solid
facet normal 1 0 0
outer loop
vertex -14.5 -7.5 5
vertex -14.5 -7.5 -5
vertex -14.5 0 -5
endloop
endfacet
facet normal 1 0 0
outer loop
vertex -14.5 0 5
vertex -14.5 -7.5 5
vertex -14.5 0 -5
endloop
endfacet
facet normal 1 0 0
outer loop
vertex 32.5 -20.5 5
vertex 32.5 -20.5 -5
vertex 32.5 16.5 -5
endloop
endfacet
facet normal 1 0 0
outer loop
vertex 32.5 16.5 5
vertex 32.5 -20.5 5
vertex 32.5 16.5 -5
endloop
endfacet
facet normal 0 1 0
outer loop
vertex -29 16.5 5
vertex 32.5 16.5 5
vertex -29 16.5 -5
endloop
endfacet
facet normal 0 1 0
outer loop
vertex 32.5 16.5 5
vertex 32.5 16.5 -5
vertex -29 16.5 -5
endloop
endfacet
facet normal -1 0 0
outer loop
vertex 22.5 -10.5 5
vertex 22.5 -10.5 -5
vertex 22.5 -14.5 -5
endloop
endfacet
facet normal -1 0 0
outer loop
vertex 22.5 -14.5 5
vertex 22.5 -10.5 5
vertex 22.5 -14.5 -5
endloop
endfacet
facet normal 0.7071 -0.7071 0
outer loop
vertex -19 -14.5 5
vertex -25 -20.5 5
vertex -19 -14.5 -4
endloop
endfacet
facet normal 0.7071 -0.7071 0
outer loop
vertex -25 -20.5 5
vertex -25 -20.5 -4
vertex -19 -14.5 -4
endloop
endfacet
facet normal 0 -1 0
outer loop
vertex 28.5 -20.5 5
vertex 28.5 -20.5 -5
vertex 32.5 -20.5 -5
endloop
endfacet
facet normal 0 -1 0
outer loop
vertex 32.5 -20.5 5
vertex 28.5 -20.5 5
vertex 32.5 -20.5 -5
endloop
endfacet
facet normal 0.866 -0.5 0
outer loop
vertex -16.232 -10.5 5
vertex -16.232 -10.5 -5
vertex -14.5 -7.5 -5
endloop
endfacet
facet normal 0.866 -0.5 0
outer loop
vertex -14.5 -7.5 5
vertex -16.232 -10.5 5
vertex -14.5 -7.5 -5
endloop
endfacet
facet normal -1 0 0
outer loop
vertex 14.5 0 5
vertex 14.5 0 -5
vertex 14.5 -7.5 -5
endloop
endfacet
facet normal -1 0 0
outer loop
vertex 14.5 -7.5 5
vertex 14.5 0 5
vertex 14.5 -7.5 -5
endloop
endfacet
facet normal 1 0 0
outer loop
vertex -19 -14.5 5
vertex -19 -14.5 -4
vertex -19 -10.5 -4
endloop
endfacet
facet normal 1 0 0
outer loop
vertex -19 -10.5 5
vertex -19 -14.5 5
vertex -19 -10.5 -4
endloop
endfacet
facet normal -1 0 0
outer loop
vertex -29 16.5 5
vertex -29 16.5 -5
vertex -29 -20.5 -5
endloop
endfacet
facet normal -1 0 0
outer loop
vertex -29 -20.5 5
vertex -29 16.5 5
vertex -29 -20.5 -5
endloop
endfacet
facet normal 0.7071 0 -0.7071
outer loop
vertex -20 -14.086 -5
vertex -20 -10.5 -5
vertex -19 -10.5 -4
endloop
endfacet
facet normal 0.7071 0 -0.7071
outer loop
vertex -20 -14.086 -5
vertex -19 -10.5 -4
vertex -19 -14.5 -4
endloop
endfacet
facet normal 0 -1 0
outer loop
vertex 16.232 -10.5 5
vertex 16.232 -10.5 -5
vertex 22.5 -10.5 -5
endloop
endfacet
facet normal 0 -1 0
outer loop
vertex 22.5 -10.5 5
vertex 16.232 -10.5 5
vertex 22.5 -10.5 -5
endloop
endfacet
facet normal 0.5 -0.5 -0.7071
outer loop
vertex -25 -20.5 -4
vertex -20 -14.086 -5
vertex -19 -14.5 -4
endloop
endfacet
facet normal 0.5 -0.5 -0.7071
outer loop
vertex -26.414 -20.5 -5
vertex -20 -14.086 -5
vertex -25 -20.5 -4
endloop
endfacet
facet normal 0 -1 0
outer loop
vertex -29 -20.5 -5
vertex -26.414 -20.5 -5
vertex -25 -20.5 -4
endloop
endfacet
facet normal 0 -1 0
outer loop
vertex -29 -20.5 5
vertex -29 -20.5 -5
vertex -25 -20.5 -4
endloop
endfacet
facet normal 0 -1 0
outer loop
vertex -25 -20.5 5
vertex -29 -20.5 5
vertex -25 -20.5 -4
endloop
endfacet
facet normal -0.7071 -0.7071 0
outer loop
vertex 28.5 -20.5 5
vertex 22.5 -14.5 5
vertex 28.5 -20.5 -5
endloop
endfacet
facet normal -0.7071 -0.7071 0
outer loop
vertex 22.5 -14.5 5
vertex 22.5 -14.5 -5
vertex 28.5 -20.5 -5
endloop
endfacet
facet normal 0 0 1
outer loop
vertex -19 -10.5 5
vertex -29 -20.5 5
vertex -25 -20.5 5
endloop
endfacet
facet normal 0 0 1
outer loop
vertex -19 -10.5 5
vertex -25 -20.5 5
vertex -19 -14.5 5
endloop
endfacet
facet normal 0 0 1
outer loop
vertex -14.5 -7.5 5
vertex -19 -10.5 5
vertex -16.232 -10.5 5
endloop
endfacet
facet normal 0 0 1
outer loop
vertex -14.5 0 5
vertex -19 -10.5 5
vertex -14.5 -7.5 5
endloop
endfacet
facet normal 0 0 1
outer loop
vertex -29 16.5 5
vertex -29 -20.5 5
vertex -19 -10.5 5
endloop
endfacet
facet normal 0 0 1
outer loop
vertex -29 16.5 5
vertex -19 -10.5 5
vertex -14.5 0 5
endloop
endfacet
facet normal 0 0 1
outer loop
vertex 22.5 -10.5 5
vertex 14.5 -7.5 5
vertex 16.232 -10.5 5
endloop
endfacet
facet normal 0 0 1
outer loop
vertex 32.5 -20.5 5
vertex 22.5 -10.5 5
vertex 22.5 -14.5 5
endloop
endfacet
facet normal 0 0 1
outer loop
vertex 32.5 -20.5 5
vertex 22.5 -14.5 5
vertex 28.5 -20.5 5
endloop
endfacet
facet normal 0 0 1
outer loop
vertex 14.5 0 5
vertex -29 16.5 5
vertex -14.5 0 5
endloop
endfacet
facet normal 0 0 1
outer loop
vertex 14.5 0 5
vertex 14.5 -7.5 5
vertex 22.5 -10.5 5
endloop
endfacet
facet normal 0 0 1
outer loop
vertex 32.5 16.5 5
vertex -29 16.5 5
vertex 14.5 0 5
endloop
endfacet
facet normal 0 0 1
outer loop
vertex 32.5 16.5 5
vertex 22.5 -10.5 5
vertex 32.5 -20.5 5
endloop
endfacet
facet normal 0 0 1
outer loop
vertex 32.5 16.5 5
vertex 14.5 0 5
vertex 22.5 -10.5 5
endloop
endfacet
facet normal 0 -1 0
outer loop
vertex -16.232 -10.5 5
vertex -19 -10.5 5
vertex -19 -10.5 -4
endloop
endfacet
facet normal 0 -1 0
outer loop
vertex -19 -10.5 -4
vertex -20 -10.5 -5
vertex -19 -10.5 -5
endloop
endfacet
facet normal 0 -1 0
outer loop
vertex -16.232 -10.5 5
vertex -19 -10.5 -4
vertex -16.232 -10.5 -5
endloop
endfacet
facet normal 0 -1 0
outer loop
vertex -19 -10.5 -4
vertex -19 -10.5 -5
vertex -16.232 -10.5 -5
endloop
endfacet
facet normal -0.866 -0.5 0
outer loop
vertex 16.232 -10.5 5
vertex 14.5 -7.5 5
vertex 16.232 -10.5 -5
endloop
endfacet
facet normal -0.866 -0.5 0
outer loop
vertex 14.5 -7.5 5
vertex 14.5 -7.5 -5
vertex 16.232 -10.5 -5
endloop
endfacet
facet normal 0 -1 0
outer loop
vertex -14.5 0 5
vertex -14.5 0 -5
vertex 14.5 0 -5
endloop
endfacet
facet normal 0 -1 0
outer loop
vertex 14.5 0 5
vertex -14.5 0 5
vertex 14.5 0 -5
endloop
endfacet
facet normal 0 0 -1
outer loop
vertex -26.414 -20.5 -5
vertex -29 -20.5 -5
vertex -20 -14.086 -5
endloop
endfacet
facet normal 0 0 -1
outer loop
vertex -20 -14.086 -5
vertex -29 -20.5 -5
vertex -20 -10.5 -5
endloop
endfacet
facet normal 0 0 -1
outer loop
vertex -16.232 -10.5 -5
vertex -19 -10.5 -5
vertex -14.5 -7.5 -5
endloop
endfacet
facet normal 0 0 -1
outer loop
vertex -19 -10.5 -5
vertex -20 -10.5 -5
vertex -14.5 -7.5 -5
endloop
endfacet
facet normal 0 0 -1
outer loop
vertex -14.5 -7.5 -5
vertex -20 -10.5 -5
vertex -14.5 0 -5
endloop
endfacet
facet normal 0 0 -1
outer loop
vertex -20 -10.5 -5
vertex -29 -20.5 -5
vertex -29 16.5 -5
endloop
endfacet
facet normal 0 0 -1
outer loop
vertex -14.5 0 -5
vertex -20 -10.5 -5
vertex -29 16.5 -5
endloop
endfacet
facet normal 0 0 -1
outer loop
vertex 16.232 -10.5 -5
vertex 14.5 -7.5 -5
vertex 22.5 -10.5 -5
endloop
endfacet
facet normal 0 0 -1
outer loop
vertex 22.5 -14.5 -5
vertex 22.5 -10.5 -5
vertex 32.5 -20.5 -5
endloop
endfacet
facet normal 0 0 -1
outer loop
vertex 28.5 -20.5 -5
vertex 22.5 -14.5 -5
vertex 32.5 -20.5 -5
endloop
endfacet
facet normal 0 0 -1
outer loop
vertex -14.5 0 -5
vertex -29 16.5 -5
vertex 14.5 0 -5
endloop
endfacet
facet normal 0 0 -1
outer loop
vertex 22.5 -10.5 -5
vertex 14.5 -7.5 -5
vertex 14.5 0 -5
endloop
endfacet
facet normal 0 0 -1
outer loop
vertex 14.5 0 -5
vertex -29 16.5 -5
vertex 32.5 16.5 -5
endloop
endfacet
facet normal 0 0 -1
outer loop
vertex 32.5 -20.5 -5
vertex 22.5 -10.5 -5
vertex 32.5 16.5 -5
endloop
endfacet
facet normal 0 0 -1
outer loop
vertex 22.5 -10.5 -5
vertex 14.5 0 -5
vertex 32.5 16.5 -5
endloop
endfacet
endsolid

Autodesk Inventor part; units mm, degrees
ref_plane "YZ Plane" through (0, 0, 0) normal (1, 0, 0) x (0, 1, 0)
ref_plane "XZ Plane" through (0, 0, 0) normal (0, 1, 0) x (-1, 0, 0)
ref_plane "XY Plane" through (0, 0, 0) normal (0, 0, 1) x (1, 0, 0)
sketch "Skizze1" plane through (0, 0, 0) normal (0, 0, 1) x (1, 0, 0)
  line L0 (-19, -14.5) -> (-19, -10.5)
  line L1 (-19, -10.5) -> (-16.2321, -10.5)
  line L2 (-16.2321, -10.5) -> (-14.5, -7.5)
  line L3 (-14.5, -7.5) -> (-14.5, 0)
  line L4 (-14.5, 0) -> (14.5, 0)
  line L5 (14.5, 0) -> (14.5, -7.5)
  line L6 (14.5, -7.5) -> (16.2321, -10.5)
  line L7 (16.2321, -10.5) -> (22.5, -10.5)
  line L8 (22.5, -10.5) -> (22.5, -14.5)
  line L9 (22.5, -14.5) -> (28.5, -20.5)
  line L10 (28.5, -20.5) -> (32.5, -20.5)
  line L11 (32.5, -20.5) -> (32.5, 16.5)
  line L12 (32.5, 16.5) -> (-29, 16.5)
  line L13 (-29, 16.5) -> (-29, -20.5)
  line L14 (-29, -20.5) -> (-25, -20.5)
  line L15 (-25, -20.5) -> (-19, -14.5)
  line L16 (0, 0) -> (0, -29.3821)
  dimension "d5" = 29
  dimension "d6" = 16.5
  dimension "d7" = 7.5
  dimension "d8" = 4.5
  dimension "d10" = 41.5
  dimension "d12" = 30
  dimension "d13" = 10
  dimension "d14" = 10
  dimension "d15" = 10.5
  dimension "d16" = 45
  dimension "d17" = 10
  dimension "d18" = 4
extrude "Extrusion1" add sketch "Skizze1" along normal mid plane 10
chamfer "Fase1" distance 1 angle 45 2 edges at (-19, -12.5, -5) (-22, -17.5, -5)
properties part number "_WT_Aufnahme_Antriebseinheit4"
